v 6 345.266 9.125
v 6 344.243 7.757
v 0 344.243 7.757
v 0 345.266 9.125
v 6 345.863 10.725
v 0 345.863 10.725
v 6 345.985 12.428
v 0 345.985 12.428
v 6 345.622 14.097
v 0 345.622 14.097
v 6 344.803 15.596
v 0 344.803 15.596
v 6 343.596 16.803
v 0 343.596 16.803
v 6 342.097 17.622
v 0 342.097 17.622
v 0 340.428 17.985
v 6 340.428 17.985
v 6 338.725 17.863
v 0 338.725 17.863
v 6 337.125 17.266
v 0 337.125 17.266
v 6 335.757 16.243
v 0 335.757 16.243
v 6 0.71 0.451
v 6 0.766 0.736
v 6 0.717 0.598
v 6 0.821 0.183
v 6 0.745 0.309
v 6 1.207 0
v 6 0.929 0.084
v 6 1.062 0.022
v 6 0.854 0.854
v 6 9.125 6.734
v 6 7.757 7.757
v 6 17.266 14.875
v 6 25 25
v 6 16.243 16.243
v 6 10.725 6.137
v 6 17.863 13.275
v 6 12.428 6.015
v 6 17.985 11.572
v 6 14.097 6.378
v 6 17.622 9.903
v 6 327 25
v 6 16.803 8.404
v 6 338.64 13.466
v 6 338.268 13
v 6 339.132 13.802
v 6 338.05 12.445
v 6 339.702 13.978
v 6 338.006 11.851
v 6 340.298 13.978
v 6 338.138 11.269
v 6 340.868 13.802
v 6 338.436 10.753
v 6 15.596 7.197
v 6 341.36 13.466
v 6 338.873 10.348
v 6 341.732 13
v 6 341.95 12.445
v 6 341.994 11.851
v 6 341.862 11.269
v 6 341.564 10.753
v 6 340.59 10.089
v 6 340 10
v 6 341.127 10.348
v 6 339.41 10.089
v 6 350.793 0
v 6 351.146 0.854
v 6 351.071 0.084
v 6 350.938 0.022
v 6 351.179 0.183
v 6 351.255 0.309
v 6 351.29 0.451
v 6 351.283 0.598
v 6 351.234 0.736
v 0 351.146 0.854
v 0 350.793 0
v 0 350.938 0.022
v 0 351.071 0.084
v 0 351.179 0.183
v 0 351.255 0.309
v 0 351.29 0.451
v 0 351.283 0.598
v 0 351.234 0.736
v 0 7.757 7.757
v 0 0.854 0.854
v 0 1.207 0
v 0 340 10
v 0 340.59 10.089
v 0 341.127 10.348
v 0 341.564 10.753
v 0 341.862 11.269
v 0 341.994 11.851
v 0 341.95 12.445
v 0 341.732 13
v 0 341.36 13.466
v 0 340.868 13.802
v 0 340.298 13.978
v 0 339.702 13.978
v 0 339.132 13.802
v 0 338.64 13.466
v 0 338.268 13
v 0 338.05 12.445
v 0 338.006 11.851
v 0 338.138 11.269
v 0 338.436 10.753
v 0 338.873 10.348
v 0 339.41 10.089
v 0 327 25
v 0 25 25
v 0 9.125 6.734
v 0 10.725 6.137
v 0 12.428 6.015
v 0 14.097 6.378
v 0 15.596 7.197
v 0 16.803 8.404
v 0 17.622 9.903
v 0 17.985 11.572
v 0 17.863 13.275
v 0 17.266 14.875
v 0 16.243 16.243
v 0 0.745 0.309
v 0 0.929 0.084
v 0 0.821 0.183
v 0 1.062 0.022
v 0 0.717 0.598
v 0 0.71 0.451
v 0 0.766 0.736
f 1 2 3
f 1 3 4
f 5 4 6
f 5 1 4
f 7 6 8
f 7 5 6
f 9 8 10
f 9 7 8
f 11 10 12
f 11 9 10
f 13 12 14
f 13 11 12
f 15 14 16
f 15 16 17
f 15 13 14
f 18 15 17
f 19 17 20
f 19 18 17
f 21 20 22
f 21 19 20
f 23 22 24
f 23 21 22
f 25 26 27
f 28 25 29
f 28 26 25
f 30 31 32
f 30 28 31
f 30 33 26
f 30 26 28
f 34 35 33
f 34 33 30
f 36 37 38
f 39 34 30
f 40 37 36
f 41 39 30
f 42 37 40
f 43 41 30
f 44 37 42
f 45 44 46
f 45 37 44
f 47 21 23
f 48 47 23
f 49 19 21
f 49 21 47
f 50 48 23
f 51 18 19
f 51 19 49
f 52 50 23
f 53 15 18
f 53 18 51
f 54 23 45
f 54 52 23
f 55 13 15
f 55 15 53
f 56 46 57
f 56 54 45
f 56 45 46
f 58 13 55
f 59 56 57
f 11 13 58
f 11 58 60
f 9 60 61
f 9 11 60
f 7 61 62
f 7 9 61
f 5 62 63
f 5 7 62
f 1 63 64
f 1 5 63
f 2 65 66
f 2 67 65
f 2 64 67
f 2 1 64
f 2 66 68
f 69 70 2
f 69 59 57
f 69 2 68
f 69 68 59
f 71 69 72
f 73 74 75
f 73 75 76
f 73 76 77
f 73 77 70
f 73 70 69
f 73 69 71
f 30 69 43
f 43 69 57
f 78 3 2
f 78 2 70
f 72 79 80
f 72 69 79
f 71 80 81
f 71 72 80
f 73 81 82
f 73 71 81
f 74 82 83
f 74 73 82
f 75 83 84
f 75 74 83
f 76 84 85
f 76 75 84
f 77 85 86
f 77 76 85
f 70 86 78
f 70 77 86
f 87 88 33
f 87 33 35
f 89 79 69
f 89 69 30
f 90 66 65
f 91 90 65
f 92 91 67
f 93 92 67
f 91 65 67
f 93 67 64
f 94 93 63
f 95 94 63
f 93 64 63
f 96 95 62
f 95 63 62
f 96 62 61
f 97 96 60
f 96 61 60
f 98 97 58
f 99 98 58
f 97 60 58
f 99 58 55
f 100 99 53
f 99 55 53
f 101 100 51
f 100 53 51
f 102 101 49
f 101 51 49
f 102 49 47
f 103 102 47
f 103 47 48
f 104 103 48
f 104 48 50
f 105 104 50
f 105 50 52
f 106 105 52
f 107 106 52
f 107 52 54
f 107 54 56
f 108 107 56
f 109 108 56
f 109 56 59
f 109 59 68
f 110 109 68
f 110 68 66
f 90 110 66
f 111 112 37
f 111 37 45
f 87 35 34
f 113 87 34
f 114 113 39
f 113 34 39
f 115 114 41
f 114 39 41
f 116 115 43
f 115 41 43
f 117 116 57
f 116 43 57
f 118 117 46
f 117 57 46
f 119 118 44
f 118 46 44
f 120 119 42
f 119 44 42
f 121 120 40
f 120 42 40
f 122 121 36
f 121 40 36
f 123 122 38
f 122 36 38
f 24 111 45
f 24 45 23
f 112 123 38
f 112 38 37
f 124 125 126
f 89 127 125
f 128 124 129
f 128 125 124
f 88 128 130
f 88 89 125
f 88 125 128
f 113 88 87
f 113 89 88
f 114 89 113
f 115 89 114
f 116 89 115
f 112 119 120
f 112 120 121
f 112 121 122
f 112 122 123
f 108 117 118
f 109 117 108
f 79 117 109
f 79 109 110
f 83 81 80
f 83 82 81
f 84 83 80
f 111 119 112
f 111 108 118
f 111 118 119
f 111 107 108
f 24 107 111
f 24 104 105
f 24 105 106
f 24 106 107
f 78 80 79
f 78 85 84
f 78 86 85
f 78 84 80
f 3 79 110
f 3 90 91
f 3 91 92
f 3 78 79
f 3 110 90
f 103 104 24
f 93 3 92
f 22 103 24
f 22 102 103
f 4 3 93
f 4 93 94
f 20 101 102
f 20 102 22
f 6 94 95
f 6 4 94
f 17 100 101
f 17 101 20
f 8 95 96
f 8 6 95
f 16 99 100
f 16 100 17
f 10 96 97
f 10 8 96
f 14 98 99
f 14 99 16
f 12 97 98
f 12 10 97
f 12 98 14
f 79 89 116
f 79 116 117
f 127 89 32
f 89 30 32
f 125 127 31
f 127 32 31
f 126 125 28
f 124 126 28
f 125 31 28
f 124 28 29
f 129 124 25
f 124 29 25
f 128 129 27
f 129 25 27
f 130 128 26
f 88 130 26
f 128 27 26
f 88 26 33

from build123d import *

# Parameters (mm, degrees)
BOSS_EXTRUDE1_DEPTH = 6
FILLET1_R           = 0.5
SKETCH4_R           = 6
BOSS_EXTRUDE2_DEPTH = 6
SKETCH3_R           = 2
SKETCH3_R_2         = 6
CUT_EXTRUDE1_DEPTH  = 353.232447151


with BuildPart() as part:
    # Sketch2 → Boss-Extrude1 (new body)
    with BuildSketch(Plane(origin=(0, 0, 0), x_dir=(0, 0, -1), z_dir=(1, 0, 0))):
        Polygon((0, 352), (0, 0), (-25, 25), (-25, 327), align=None)
    extrude(amount=BOSS_EXTRUDE1_DEPTH)

    # Fillet1
    fillet1_edges = [part.edges().sort_by_distance(p)[0] for p in [
        (3, 352, 0),
        (3, 0, 0),
    ]]
    fillet(fillet1_edges, radius=FILLET1_R)

    # Sketch4 → Boss-Extrude2 (add)
    with BuildSketch(Plane(origin=(6, 0, 0), x_dir=(0, 0, -1), z_dir=(1, 0, 0))):
        with Locations((-12, 340)):
            Circle(SKETCH4_R)
    extrude(amount=-BOSS_EXTRUDE2_DEPTH)

    # Sketch3 → Cut-Extrude1 (cut, through all)
    with BuildSketch(Plane(origin=(6, 0, 0), x_dir=(0, 0, -1), z_dir=(1, 0, 0))):
        with Locations((-12, 340)):
            Circle(SKETCH3_R)
        with Locations((-12, 12)):
            Circle(SKETCH3_R_2)
    extrude(amount=-CUT_EXTRUDE1_DEPTH, mode=Mode.SUBTRACT)


solid = part.part
